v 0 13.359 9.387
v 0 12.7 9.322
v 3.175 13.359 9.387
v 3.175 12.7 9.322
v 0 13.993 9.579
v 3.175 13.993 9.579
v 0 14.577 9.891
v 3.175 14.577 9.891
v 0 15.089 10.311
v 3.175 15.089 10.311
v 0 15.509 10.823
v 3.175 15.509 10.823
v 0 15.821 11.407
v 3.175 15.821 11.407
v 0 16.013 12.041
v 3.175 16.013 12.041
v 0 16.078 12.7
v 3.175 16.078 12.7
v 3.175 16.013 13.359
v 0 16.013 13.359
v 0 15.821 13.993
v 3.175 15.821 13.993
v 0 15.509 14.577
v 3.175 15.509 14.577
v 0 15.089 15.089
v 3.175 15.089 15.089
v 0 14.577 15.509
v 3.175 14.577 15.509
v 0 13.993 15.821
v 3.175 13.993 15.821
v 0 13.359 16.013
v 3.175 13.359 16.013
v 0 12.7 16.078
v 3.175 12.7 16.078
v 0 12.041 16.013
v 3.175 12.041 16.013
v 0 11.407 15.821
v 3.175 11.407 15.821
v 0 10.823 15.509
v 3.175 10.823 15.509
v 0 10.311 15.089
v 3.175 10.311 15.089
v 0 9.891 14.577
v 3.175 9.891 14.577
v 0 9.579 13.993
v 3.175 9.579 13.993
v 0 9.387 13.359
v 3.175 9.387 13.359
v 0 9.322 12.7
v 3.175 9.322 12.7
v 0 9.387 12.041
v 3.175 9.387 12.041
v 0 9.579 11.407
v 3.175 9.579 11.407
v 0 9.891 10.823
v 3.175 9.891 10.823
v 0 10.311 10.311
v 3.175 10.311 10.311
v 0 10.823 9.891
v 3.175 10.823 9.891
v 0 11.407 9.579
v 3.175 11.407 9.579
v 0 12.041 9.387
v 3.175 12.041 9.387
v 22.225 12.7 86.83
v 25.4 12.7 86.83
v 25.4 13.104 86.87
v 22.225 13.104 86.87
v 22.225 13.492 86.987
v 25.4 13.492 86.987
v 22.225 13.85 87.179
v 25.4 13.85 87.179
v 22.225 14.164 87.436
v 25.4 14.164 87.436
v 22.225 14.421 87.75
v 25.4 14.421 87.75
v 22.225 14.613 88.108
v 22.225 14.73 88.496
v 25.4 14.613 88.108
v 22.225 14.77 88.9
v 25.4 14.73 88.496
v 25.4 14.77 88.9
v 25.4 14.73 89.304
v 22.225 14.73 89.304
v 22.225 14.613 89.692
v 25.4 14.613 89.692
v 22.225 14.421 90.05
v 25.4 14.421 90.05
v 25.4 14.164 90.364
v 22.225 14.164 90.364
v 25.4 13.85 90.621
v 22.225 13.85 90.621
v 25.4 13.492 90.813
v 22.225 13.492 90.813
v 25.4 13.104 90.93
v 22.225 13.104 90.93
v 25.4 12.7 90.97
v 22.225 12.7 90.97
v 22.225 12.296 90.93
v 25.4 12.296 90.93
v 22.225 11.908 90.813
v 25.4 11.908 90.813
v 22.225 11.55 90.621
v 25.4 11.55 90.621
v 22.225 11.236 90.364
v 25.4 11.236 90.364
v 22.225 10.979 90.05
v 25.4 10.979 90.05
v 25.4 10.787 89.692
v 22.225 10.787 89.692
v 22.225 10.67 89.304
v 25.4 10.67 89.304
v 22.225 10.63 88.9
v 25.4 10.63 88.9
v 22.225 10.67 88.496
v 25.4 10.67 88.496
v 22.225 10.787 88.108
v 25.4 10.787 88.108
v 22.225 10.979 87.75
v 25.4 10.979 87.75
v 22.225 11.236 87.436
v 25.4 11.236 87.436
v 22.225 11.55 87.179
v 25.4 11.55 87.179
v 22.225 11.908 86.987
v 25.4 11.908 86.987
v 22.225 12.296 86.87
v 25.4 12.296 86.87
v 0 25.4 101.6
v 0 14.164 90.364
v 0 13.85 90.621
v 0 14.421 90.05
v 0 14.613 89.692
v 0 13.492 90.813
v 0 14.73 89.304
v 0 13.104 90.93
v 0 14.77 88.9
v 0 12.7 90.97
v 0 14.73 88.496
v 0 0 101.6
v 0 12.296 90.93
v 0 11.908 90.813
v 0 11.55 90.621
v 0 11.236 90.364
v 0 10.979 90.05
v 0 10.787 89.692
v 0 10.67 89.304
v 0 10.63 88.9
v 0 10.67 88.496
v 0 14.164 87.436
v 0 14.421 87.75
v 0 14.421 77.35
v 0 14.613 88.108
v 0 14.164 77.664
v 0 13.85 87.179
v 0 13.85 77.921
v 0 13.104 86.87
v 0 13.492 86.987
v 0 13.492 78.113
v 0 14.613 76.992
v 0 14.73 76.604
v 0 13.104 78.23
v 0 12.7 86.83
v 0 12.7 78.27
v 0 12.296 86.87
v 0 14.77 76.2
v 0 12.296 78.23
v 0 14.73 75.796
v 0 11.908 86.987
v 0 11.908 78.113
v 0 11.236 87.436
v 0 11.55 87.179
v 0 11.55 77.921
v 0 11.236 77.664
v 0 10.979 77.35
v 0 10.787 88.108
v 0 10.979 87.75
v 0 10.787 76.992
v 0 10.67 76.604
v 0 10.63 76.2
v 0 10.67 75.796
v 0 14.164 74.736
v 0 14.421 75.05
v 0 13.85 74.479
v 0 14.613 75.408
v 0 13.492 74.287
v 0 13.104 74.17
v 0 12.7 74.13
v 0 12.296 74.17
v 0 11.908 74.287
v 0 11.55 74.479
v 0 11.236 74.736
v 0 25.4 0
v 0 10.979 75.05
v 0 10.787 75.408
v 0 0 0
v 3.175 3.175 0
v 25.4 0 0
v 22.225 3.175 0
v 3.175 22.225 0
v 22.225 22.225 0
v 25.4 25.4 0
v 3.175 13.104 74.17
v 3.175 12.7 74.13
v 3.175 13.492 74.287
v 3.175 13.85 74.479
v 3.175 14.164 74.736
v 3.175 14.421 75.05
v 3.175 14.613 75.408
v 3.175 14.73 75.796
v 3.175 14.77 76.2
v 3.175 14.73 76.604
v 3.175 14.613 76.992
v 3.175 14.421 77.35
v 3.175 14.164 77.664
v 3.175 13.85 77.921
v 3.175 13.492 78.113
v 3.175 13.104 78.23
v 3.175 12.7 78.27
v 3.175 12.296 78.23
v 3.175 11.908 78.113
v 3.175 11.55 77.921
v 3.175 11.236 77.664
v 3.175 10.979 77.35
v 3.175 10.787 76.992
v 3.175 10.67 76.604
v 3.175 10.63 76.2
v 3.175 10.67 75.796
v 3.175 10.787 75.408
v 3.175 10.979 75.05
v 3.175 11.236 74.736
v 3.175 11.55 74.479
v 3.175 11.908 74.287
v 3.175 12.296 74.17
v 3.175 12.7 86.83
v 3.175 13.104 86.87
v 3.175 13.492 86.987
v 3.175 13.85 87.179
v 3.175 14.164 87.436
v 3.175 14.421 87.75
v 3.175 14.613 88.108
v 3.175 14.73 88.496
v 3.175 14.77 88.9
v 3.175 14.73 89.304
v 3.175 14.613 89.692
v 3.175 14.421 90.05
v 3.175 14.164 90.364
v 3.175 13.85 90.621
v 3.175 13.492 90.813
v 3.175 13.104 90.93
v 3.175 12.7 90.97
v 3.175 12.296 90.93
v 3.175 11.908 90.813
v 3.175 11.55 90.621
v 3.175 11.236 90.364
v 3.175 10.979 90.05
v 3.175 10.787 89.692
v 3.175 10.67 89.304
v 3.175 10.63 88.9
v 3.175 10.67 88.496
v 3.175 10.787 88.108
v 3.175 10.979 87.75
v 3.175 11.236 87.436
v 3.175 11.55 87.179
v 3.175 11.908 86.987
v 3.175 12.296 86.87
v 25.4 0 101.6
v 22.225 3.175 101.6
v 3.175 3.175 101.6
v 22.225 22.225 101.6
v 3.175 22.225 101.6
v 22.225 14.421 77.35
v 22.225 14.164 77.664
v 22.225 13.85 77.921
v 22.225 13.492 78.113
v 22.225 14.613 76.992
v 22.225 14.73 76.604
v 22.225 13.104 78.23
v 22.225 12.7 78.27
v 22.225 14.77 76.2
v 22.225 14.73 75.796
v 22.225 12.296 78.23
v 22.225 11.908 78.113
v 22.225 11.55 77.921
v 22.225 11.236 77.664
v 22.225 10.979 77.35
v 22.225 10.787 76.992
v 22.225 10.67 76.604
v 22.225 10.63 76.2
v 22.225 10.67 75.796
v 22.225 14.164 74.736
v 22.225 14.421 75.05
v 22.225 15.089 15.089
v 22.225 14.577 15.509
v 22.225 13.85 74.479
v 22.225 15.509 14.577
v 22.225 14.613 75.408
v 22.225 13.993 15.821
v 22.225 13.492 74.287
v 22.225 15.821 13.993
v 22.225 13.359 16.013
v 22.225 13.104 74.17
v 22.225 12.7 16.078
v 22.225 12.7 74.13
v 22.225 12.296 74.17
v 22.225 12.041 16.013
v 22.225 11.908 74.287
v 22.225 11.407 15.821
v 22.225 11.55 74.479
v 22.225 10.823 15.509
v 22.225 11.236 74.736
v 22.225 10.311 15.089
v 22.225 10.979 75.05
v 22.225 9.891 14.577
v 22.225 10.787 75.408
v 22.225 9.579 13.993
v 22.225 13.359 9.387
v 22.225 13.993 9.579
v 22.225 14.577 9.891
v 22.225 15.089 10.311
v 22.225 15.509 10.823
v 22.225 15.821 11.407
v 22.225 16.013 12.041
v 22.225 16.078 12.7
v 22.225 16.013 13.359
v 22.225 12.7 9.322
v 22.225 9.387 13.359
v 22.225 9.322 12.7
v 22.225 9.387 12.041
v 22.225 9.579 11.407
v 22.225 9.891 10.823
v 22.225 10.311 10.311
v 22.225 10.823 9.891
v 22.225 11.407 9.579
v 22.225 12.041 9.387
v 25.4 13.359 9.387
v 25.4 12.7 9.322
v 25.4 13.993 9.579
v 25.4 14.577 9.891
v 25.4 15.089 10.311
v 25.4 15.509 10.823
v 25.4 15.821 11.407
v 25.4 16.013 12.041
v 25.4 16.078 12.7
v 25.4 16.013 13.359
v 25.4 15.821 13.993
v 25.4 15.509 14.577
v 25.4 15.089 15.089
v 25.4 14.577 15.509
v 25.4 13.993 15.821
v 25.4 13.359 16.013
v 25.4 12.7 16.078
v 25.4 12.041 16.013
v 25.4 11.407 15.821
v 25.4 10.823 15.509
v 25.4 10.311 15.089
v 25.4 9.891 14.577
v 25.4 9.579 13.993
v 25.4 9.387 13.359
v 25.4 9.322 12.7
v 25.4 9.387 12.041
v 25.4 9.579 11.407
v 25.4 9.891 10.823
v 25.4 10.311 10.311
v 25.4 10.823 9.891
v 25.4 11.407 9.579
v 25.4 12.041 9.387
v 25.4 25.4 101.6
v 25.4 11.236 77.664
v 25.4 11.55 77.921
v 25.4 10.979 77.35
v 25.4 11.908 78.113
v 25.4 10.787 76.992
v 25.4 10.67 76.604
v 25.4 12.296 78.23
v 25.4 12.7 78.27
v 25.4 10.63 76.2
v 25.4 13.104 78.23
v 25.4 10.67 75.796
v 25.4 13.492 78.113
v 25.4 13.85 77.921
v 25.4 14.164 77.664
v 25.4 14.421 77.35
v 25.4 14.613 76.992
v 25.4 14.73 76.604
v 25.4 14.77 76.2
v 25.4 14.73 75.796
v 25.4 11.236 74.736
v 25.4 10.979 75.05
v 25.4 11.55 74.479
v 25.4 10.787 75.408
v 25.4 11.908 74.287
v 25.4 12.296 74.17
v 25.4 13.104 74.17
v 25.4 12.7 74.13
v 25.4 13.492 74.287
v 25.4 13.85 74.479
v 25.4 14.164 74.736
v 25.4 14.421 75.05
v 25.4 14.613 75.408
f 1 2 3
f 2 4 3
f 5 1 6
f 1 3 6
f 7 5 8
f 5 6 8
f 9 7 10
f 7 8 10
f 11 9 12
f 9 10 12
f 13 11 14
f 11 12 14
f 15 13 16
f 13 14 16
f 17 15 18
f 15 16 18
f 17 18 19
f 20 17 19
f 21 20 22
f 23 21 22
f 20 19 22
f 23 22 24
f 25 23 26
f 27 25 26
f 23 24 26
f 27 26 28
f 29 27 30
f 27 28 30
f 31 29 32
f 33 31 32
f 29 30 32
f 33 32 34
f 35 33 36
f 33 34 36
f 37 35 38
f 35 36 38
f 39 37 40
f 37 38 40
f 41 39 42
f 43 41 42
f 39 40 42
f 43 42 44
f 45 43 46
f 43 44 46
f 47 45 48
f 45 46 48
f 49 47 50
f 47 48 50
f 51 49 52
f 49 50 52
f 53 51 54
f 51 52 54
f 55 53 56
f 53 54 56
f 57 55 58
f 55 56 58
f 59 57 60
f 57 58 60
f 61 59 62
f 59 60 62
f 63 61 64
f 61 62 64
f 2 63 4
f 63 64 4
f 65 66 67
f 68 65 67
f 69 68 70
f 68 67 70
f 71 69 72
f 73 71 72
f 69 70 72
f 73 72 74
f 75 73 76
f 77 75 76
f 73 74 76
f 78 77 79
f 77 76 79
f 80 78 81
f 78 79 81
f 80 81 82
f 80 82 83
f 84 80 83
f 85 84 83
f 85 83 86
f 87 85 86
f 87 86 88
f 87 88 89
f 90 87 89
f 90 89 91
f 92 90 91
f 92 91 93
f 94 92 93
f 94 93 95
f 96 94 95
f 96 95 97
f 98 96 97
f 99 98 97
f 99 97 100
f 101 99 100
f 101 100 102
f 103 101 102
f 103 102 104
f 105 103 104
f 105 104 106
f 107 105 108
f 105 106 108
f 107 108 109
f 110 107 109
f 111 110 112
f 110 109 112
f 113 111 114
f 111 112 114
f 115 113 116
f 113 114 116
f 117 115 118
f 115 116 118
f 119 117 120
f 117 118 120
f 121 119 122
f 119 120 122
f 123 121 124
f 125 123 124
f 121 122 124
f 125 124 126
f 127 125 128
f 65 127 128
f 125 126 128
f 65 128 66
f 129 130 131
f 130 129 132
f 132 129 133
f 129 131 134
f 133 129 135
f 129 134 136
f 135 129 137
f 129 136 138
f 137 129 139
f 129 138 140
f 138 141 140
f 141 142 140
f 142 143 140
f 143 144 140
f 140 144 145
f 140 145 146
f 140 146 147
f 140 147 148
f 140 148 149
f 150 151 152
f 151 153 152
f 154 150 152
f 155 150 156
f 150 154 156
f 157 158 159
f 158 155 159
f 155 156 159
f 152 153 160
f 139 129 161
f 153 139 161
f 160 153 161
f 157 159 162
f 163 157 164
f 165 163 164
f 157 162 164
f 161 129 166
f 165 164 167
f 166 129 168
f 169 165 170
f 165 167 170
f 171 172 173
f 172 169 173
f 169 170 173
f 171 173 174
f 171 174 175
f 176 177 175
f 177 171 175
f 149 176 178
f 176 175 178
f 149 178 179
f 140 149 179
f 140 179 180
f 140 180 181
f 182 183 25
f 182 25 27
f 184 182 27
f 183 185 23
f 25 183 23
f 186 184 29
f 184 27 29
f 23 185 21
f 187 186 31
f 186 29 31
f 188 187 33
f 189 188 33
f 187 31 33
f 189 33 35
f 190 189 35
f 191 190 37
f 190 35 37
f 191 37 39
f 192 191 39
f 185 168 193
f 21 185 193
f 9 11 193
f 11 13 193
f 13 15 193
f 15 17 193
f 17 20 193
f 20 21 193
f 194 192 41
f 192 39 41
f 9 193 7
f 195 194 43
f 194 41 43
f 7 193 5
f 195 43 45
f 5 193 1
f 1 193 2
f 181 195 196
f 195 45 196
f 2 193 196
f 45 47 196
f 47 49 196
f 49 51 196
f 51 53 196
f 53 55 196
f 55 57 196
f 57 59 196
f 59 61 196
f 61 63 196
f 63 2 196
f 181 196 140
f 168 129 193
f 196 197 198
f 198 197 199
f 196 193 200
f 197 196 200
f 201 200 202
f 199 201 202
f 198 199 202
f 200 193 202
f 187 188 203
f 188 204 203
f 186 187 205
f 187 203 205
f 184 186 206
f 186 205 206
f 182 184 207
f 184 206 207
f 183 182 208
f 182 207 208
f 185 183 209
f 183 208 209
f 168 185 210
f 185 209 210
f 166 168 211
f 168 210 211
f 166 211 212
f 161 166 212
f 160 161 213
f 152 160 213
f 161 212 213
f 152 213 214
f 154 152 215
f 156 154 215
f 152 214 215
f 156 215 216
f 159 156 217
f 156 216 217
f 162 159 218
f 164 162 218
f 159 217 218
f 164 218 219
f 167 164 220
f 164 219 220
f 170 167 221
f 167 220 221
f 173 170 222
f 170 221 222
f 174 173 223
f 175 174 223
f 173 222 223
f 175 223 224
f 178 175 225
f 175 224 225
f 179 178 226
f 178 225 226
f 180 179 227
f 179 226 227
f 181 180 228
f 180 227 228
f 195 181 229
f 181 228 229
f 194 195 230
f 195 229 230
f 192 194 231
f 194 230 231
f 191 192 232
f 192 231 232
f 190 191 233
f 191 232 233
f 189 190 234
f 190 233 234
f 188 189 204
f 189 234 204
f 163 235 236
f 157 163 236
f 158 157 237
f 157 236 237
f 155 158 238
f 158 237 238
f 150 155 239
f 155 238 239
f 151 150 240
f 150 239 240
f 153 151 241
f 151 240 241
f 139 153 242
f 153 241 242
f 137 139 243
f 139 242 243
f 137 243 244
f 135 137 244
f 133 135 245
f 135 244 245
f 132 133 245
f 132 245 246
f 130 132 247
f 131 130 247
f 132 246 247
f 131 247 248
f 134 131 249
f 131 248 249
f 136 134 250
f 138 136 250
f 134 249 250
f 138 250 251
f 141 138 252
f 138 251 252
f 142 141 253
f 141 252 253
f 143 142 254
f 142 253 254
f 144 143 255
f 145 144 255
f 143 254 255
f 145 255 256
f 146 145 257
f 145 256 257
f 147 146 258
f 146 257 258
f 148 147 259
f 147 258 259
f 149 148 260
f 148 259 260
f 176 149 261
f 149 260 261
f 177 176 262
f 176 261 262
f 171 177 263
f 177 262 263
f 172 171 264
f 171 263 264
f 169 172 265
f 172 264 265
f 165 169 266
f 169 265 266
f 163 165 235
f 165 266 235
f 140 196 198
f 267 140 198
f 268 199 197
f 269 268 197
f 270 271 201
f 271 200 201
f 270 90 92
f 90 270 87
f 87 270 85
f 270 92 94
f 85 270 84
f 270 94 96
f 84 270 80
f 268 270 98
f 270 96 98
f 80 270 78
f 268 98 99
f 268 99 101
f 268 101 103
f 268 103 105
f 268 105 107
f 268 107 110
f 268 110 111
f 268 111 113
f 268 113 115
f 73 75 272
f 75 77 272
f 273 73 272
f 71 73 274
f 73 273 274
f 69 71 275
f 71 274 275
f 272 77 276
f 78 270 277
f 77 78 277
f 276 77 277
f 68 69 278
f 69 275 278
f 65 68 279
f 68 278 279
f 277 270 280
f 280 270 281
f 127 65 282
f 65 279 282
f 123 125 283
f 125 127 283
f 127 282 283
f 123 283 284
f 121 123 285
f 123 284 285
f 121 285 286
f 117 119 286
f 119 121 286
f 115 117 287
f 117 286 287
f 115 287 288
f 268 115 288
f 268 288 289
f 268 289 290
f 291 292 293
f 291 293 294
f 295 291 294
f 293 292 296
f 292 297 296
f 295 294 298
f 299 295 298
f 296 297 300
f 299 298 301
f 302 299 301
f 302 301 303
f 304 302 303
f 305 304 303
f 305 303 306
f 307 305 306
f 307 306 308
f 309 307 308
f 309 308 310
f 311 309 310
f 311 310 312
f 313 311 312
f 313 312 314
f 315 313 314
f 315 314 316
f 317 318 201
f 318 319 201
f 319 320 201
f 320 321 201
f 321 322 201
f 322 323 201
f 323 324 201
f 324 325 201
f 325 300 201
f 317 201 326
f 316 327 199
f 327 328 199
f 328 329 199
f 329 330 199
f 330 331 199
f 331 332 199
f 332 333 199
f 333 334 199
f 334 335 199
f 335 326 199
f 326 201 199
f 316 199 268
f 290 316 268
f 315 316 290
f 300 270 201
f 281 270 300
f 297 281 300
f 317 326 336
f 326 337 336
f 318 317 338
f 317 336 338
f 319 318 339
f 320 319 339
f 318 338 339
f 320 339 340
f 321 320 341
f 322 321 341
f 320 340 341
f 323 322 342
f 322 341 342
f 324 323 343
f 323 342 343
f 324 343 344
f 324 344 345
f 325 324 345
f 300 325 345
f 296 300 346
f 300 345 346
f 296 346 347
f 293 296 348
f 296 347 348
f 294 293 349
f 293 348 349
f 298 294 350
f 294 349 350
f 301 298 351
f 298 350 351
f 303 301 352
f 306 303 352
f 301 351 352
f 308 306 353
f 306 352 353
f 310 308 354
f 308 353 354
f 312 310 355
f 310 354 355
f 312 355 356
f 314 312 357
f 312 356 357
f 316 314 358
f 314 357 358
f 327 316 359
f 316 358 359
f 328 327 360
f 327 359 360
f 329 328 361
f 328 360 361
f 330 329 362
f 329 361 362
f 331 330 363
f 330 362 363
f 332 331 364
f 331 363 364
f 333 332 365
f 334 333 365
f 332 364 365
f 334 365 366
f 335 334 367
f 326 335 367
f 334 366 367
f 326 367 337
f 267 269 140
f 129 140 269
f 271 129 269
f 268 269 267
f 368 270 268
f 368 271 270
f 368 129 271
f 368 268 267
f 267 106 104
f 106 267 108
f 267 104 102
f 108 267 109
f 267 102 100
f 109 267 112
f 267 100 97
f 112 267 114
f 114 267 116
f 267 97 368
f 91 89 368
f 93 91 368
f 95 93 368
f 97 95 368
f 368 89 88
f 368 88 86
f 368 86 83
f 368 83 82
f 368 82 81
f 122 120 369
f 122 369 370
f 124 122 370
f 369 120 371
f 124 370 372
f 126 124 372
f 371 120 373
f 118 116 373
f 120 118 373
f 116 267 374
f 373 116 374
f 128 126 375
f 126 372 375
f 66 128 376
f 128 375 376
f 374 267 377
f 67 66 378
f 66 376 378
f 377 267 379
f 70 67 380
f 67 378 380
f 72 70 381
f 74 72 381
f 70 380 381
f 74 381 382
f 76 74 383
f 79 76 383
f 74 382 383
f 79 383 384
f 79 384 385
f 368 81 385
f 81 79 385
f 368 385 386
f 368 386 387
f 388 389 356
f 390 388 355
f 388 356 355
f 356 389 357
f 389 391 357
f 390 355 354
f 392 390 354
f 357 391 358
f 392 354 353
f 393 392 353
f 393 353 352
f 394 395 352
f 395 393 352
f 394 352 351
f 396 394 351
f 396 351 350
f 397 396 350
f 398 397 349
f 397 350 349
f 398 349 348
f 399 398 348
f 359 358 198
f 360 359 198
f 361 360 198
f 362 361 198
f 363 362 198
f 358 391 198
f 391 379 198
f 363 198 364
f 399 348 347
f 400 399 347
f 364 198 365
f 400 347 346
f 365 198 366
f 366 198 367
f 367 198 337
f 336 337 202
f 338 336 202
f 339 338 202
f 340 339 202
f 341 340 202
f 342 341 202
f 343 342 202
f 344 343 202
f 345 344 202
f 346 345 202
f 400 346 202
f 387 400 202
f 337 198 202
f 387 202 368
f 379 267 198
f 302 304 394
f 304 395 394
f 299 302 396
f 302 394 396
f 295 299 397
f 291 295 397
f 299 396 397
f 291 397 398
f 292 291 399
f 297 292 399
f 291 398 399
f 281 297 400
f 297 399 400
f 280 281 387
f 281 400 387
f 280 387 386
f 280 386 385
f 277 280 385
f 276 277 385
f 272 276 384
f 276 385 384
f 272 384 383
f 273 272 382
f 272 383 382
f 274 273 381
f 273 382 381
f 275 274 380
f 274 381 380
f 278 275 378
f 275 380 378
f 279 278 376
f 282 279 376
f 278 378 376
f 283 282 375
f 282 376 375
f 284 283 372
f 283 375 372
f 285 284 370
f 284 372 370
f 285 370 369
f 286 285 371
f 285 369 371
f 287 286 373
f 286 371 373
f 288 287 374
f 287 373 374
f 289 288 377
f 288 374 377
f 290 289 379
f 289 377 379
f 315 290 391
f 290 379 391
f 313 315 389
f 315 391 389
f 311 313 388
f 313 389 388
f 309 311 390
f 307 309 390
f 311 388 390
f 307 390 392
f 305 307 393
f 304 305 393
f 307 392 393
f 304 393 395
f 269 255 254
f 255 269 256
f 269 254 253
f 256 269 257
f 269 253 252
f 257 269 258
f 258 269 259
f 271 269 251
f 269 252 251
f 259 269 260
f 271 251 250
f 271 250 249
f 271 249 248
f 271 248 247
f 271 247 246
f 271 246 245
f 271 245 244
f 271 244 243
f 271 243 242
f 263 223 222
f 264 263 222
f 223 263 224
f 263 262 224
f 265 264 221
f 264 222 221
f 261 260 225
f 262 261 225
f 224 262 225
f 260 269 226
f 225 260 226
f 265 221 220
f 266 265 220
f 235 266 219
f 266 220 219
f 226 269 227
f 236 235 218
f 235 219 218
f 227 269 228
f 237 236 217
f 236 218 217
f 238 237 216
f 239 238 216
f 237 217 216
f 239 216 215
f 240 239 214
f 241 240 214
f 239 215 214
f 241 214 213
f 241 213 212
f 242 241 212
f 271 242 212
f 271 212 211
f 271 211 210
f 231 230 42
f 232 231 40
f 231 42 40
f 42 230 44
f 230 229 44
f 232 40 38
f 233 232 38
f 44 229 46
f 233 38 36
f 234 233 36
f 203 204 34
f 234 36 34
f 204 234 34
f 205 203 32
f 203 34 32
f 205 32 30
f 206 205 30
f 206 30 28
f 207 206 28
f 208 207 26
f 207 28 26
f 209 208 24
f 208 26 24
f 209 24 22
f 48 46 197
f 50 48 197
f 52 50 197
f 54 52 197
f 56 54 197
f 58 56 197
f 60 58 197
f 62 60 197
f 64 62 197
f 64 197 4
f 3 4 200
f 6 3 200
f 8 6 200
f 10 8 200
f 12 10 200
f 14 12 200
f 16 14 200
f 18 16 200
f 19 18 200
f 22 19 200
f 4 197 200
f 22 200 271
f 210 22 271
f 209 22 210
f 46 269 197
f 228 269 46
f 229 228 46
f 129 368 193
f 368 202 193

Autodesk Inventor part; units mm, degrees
ref_plane "YZ Plane" through (0, 0, 0) normal (1, 0, 0) x (0, 1, 0)
ref_plane "XZ Plane" through (0, 0, 0) normal (0, 1, 0) x (-1, 0, 0)
ref_plane "XY Plane" through (0, 0, 0) normal (0, 0, 1) x (1, 0, 0)
sketch "Sketch1" plane through (0, 0, 0) normal (0, 0, 1) x (1, 0, 0)
  line L0 (0, 0) -> (25.4, 0)
  line L1 (25.4, 0) -> (25.4, 25.4)
  line L2 (25.4, 25.4) -> (0, 25.4)
  line L3 (0, 25.4) -> (0, 0)
  line L4 (3.175, 22.225) -> (22.225, 22.225)
  line L5 (22.225, 22.225) -> (22.225, 3.175)
  line L6 (22.225, 3.175) -> (3.175, 3.175)
  line L7 (3.175, 3.175) -> (3.175, 22.225)
  dimension "d0" = 25.4
  dimension "d1" = 25.4
  dimension "d2" = 3.175
extrude "Extrusion1" add sketch "Sketch1" along normal blind 101.6
sketch "Sketch2" plane through (25.4, 0, 0) normal (1, 0, 0) x (0, 0, -1)
  line L0 (0, 0) -> (0, 25.4) projected
  line L1 (-101.6, 0) -> (-101.6, 25.4) projected
  line L2 (0, 0) -> (-101.6, 0) projected
  circle A0 centre (-88.9, 12.7) radius 2.0701
  circle A1 centre (-76.2, 12.7) radius 2.0701
  circle A2 centre (-12.7, 12.7) radius 3.3782
  dimension "d5" = 4.1402
  dimension "d6" = 12.7
  dimension "d7" = 12.7
  dimension "d10" = 12.7
  dimension "d15" = 6.7564
  dimension "d16" = 12.7
  dimension "d17" = 12.7
extrude "Extrusion2" cut sketch "Sketch2" against normal blind 101.6
properties part number "Clapper Outer Cable Hard Stop (2)"
